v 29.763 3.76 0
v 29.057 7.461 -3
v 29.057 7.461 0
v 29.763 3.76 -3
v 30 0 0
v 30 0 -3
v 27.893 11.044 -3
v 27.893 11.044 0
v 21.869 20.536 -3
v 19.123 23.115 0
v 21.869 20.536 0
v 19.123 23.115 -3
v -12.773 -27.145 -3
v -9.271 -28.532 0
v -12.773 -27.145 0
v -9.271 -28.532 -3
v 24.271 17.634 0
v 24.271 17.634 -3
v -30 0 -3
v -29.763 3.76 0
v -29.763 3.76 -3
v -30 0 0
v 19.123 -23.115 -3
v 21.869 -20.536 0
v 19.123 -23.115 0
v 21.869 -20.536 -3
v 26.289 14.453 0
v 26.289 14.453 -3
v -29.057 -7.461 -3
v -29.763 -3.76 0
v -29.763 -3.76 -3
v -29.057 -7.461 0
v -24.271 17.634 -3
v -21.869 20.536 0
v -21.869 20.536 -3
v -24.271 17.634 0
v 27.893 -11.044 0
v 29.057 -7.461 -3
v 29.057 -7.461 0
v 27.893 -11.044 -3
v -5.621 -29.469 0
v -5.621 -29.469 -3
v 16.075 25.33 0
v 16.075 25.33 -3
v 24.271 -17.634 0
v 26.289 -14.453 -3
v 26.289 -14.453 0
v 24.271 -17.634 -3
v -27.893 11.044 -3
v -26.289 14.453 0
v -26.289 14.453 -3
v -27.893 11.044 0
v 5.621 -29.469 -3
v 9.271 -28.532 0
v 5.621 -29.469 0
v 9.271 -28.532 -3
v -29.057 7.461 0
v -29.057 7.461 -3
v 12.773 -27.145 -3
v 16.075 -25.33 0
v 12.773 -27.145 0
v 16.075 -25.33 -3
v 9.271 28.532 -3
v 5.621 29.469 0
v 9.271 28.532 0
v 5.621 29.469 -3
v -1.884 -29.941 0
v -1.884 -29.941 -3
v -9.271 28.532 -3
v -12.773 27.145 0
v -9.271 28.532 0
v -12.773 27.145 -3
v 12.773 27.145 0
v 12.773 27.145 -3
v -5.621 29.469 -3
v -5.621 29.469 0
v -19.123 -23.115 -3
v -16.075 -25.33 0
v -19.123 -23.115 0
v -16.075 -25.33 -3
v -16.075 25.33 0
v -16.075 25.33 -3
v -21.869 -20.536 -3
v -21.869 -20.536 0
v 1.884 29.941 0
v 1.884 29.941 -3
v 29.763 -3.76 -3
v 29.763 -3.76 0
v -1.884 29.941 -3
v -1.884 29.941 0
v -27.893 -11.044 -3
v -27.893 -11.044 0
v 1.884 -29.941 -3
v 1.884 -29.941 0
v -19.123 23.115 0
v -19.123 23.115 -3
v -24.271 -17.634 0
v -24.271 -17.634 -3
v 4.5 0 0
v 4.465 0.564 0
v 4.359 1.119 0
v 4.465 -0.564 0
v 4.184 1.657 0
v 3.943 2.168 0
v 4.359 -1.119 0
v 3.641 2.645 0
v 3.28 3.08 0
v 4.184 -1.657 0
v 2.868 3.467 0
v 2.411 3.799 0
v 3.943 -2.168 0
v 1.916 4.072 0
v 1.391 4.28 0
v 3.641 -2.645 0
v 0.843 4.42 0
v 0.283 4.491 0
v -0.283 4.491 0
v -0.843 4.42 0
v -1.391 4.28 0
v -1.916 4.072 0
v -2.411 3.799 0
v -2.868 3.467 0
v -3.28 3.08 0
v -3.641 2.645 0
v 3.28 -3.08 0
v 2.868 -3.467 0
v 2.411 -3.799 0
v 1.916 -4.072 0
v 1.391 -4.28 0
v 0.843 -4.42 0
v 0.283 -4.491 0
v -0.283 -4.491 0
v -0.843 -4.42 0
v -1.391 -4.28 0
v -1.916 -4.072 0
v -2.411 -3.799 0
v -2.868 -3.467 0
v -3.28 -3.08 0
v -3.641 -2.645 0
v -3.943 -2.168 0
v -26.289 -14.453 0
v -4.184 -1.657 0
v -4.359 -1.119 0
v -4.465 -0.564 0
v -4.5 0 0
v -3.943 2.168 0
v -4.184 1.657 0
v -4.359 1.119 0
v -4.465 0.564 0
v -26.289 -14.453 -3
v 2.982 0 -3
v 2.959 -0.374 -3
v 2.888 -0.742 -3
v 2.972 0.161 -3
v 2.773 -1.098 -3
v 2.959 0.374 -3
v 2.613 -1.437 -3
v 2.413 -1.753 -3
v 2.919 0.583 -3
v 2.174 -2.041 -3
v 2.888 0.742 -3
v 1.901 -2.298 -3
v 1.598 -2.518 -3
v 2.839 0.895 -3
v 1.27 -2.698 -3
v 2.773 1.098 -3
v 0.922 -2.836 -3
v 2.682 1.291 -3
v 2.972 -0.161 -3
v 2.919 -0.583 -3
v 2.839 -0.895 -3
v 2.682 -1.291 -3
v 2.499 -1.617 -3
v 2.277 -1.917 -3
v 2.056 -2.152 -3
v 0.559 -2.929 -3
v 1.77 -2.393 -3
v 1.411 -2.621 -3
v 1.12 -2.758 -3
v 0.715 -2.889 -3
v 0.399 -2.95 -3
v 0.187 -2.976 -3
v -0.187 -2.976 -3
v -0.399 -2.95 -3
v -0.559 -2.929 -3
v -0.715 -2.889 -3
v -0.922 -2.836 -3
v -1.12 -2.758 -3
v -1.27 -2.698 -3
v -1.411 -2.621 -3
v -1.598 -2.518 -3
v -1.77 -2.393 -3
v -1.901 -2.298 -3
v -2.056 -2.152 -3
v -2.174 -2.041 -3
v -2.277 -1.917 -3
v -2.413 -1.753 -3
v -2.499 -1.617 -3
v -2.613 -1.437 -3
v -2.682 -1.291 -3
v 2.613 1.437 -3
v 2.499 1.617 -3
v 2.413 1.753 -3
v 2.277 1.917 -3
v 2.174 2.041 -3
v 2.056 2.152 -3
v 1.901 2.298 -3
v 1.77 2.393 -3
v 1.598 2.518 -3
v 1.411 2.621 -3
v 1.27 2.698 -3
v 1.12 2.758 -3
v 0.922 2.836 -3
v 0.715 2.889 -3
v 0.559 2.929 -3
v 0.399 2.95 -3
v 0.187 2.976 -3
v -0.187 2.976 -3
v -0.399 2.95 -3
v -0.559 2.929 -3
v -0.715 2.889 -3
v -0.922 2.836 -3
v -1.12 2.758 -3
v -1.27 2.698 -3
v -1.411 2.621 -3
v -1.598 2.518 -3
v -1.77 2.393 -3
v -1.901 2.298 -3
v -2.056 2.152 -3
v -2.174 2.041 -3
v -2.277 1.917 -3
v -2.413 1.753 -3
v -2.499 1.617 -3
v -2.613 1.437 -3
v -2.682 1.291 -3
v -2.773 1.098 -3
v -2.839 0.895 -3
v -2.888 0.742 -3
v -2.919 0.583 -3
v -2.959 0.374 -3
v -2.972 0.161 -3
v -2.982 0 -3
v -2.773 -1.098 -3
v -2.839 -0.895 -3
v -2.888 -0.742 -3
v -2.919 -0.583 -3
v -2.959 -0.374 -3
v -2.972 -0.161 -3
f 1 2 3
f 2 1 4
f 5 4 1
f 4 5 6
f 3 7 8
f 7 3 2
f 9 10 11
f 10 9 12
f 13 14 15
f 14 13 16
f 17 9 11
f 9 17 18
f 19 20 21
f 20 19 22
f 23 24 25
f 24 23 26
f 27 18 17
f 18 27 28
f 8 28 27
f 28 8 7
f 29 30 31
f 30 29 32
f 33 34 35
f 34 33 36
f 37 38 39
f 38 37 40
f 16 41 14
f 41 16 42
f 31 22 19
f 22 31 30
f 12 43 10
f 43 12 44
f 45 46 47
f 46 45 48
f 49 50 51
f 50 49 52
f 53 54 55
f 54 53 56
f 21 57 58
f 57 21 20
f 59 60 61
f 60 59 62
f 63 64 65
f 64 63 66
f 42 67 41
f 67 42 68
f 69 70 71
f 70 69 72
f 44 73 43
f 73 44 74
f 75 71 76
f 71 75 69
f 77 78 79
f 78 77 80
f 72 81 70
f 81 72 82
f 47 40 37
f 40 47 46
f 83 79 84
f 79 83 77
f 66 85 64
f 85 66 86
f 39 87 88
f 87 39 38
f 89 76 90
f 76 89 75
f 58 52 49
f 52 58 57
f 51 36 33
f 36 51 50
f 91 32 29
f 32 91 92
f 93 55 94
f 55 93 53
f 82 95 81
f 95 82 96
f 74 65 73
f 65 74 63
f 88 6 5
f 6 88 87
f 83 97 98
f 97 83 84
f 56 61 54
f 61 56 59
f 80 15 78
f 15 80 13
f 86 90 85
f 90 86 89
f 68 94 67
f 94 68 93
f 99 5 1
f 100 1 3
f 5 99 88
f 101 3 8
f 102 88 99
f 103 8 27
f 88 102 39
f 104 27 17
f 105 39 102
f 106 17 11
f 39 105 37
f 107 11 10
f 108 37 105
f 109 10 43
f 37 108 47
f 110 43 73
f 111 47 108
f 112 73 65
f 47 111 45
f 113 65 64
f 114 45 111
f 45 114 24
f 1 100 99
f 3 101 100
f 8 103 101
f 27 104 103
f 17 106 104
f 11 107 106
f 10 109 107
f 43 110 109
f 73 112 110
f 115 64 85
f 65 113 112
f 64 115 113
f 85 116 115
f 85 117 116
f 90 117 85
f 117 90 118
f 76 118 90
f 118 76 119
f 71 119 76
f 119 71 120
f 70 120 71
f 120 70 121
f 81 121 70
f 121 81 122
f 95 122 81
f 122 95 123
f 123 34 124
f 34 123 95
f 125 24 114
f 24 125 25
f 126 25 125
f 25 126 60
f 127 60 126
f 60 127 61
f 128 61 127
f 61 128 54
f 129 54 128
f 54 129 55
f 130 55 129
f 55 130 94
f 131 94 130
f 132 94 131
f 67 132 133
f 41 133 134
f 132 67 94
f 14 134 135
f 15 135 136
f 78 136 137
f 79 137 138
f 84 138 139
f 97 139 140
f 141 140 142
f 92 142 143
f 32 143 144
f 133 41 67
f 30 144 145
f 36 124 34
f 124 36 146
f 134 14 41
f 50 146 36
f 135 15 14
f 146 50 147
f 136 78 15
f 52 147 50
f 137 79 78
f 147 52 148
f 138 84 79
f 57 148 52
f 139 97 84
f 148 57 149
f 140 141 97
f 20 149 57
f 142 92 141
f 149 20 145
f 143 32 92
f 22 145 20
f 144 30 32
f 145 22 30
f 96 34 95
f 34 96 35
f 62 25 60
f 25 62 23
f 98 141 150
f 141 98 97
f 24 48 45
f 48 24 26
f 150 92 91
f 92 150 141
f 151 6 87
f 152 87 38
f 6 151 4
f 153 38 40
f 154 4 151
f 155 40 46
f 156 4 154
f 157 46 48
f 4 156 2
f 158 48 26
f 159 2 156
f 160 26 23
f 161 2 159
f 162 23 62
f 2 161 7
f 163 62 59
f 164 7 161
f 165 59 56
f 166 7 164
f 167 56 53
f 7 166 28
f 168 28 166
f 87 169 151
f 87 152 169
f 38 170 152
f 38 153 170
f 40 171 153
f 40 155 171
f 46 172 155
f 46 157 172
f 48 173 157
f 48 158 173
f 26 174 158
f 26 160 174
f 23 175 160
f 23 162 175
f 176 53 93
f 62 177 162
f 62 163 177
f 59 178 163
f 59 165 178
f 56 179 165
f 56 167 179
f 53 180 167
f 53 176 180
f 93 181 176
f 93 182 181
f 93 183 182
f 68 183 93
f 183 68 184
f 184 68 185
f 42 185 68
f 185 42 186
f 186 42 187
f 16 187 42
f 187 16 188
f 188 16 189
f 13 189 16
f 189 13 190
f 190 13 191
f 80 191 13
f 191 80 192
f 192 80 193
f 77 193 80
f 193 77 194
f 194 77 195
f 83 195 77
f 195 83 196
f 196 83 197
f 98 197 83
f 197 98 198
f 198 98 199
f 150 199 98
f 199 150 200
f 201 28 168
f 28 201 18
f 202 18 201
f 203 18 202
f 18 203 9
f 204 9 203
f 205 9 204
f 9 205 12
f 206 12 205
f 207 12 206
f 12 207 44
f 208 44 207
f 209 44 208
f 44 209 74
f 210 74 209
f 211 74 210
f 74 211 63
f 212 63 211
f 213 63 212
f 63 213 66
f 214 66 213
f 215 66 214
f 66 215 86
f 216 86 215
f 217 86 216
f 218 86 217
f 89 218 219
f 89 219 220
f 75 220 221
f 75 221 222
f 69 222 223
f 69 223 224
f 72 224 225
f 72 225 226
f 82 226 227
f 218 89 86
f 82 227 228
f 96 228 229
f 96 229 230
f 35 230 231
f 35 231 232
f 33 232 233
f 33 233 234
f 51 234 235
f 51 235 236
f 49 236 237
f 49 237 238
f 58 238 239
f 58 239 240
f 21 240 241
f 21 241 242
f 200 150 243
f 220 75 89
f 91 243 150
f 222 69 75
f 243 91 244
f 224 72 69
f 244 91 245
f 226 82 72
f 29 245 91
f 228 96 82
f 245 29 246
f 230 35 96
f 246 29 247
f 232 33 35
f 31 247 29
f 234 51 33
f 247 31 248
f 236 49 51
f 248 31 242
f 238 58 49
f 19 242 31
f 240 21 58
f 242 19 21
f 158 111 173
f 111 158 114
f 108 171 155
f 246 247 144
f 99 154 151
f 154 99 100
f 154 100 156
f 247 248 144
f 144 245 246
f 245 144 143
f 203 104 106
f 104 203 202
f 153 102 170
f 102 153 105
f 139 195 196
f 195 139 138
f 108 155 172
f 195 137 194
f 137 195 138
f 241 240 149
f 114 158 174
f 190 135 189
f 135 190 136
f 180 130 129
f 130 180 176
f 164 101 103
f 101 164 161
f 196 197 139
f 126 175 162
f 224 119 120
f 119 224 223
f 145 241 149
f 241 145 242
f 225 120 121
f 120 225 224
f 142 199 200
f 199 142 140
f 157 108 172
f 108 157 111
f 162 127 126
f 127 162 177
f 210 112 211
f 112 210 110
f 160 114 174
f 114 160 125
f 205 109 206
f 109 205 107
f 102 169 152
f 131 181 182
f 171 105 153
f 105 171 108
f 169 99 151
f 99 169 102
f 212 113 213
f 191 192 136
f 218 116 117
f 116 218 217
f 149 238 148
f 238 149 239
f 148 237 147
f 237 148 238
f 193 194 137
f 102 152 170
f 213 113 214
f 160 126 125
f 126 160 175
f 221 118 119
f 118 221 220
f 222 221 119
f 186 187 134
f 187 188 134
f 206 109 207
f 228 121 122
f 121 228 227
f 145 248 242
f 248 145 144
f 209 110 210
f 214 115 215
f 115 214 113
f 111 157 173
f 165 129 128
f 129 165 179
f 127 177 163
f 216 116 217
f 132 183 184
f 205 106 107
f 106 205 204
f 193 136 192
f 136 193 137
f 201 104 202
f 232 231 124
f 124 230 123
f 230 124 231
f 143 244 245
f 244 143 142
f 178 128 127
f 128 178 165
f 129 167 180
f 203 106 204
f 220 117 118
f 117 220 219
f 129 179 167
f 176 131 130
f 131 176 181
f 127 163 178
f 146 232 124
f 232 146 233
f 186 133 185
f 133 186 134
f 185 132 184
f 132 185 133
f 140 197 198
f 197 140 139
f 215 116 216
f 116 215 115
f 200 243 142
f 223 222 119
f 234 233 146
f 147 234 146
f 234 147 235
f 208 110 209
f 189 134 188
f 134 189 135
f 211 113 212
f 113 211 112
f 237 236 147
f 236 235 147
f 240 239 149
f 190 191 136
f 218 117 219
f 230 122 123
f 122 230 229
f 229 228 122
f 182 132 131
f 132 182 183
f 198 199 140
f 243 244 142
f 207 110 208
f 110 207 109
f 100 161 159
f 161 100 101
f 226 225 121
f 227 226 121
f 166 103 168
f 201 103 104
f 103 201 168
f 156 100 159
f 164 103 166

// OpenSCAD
$fn = 50;


difference() {
	union() {
		translate(v = [0, 0, -3.0000000000]) {
			cylinder(h = 3, r = 30.0000000000);
		}
		translate(v = [0, 0, -3.0000000000]) {
			cylinder(h = 3, r = 2.8750000000);
		}
	}
	union() {
		translate(v = [0, 0, 0]) {
			rotate(a = [0, 0, 0]) {
				difference() {
					union() {
						translate(v = [0, 0, -3.0000000000]) {
							cylinder(h = 3, r = 2.2500000000);
						}
						translate(v = [0, 0, -4.2000000000]) {
							cylinder(h = 4.2000000000, r1 = 2.3750000000, r2 = 4.5000000000);
						}
						translate(v = [0, 0, -3.0000000000]) {
							cylinder(h = 3, r = 2.3750000000);
						}
						translate(v = [0, 0, -3.0000000000]) {
							cylinder(h = 3, r = 2.2500000000);
						}
					}
					union();
				}
			}
		}
	}
}
